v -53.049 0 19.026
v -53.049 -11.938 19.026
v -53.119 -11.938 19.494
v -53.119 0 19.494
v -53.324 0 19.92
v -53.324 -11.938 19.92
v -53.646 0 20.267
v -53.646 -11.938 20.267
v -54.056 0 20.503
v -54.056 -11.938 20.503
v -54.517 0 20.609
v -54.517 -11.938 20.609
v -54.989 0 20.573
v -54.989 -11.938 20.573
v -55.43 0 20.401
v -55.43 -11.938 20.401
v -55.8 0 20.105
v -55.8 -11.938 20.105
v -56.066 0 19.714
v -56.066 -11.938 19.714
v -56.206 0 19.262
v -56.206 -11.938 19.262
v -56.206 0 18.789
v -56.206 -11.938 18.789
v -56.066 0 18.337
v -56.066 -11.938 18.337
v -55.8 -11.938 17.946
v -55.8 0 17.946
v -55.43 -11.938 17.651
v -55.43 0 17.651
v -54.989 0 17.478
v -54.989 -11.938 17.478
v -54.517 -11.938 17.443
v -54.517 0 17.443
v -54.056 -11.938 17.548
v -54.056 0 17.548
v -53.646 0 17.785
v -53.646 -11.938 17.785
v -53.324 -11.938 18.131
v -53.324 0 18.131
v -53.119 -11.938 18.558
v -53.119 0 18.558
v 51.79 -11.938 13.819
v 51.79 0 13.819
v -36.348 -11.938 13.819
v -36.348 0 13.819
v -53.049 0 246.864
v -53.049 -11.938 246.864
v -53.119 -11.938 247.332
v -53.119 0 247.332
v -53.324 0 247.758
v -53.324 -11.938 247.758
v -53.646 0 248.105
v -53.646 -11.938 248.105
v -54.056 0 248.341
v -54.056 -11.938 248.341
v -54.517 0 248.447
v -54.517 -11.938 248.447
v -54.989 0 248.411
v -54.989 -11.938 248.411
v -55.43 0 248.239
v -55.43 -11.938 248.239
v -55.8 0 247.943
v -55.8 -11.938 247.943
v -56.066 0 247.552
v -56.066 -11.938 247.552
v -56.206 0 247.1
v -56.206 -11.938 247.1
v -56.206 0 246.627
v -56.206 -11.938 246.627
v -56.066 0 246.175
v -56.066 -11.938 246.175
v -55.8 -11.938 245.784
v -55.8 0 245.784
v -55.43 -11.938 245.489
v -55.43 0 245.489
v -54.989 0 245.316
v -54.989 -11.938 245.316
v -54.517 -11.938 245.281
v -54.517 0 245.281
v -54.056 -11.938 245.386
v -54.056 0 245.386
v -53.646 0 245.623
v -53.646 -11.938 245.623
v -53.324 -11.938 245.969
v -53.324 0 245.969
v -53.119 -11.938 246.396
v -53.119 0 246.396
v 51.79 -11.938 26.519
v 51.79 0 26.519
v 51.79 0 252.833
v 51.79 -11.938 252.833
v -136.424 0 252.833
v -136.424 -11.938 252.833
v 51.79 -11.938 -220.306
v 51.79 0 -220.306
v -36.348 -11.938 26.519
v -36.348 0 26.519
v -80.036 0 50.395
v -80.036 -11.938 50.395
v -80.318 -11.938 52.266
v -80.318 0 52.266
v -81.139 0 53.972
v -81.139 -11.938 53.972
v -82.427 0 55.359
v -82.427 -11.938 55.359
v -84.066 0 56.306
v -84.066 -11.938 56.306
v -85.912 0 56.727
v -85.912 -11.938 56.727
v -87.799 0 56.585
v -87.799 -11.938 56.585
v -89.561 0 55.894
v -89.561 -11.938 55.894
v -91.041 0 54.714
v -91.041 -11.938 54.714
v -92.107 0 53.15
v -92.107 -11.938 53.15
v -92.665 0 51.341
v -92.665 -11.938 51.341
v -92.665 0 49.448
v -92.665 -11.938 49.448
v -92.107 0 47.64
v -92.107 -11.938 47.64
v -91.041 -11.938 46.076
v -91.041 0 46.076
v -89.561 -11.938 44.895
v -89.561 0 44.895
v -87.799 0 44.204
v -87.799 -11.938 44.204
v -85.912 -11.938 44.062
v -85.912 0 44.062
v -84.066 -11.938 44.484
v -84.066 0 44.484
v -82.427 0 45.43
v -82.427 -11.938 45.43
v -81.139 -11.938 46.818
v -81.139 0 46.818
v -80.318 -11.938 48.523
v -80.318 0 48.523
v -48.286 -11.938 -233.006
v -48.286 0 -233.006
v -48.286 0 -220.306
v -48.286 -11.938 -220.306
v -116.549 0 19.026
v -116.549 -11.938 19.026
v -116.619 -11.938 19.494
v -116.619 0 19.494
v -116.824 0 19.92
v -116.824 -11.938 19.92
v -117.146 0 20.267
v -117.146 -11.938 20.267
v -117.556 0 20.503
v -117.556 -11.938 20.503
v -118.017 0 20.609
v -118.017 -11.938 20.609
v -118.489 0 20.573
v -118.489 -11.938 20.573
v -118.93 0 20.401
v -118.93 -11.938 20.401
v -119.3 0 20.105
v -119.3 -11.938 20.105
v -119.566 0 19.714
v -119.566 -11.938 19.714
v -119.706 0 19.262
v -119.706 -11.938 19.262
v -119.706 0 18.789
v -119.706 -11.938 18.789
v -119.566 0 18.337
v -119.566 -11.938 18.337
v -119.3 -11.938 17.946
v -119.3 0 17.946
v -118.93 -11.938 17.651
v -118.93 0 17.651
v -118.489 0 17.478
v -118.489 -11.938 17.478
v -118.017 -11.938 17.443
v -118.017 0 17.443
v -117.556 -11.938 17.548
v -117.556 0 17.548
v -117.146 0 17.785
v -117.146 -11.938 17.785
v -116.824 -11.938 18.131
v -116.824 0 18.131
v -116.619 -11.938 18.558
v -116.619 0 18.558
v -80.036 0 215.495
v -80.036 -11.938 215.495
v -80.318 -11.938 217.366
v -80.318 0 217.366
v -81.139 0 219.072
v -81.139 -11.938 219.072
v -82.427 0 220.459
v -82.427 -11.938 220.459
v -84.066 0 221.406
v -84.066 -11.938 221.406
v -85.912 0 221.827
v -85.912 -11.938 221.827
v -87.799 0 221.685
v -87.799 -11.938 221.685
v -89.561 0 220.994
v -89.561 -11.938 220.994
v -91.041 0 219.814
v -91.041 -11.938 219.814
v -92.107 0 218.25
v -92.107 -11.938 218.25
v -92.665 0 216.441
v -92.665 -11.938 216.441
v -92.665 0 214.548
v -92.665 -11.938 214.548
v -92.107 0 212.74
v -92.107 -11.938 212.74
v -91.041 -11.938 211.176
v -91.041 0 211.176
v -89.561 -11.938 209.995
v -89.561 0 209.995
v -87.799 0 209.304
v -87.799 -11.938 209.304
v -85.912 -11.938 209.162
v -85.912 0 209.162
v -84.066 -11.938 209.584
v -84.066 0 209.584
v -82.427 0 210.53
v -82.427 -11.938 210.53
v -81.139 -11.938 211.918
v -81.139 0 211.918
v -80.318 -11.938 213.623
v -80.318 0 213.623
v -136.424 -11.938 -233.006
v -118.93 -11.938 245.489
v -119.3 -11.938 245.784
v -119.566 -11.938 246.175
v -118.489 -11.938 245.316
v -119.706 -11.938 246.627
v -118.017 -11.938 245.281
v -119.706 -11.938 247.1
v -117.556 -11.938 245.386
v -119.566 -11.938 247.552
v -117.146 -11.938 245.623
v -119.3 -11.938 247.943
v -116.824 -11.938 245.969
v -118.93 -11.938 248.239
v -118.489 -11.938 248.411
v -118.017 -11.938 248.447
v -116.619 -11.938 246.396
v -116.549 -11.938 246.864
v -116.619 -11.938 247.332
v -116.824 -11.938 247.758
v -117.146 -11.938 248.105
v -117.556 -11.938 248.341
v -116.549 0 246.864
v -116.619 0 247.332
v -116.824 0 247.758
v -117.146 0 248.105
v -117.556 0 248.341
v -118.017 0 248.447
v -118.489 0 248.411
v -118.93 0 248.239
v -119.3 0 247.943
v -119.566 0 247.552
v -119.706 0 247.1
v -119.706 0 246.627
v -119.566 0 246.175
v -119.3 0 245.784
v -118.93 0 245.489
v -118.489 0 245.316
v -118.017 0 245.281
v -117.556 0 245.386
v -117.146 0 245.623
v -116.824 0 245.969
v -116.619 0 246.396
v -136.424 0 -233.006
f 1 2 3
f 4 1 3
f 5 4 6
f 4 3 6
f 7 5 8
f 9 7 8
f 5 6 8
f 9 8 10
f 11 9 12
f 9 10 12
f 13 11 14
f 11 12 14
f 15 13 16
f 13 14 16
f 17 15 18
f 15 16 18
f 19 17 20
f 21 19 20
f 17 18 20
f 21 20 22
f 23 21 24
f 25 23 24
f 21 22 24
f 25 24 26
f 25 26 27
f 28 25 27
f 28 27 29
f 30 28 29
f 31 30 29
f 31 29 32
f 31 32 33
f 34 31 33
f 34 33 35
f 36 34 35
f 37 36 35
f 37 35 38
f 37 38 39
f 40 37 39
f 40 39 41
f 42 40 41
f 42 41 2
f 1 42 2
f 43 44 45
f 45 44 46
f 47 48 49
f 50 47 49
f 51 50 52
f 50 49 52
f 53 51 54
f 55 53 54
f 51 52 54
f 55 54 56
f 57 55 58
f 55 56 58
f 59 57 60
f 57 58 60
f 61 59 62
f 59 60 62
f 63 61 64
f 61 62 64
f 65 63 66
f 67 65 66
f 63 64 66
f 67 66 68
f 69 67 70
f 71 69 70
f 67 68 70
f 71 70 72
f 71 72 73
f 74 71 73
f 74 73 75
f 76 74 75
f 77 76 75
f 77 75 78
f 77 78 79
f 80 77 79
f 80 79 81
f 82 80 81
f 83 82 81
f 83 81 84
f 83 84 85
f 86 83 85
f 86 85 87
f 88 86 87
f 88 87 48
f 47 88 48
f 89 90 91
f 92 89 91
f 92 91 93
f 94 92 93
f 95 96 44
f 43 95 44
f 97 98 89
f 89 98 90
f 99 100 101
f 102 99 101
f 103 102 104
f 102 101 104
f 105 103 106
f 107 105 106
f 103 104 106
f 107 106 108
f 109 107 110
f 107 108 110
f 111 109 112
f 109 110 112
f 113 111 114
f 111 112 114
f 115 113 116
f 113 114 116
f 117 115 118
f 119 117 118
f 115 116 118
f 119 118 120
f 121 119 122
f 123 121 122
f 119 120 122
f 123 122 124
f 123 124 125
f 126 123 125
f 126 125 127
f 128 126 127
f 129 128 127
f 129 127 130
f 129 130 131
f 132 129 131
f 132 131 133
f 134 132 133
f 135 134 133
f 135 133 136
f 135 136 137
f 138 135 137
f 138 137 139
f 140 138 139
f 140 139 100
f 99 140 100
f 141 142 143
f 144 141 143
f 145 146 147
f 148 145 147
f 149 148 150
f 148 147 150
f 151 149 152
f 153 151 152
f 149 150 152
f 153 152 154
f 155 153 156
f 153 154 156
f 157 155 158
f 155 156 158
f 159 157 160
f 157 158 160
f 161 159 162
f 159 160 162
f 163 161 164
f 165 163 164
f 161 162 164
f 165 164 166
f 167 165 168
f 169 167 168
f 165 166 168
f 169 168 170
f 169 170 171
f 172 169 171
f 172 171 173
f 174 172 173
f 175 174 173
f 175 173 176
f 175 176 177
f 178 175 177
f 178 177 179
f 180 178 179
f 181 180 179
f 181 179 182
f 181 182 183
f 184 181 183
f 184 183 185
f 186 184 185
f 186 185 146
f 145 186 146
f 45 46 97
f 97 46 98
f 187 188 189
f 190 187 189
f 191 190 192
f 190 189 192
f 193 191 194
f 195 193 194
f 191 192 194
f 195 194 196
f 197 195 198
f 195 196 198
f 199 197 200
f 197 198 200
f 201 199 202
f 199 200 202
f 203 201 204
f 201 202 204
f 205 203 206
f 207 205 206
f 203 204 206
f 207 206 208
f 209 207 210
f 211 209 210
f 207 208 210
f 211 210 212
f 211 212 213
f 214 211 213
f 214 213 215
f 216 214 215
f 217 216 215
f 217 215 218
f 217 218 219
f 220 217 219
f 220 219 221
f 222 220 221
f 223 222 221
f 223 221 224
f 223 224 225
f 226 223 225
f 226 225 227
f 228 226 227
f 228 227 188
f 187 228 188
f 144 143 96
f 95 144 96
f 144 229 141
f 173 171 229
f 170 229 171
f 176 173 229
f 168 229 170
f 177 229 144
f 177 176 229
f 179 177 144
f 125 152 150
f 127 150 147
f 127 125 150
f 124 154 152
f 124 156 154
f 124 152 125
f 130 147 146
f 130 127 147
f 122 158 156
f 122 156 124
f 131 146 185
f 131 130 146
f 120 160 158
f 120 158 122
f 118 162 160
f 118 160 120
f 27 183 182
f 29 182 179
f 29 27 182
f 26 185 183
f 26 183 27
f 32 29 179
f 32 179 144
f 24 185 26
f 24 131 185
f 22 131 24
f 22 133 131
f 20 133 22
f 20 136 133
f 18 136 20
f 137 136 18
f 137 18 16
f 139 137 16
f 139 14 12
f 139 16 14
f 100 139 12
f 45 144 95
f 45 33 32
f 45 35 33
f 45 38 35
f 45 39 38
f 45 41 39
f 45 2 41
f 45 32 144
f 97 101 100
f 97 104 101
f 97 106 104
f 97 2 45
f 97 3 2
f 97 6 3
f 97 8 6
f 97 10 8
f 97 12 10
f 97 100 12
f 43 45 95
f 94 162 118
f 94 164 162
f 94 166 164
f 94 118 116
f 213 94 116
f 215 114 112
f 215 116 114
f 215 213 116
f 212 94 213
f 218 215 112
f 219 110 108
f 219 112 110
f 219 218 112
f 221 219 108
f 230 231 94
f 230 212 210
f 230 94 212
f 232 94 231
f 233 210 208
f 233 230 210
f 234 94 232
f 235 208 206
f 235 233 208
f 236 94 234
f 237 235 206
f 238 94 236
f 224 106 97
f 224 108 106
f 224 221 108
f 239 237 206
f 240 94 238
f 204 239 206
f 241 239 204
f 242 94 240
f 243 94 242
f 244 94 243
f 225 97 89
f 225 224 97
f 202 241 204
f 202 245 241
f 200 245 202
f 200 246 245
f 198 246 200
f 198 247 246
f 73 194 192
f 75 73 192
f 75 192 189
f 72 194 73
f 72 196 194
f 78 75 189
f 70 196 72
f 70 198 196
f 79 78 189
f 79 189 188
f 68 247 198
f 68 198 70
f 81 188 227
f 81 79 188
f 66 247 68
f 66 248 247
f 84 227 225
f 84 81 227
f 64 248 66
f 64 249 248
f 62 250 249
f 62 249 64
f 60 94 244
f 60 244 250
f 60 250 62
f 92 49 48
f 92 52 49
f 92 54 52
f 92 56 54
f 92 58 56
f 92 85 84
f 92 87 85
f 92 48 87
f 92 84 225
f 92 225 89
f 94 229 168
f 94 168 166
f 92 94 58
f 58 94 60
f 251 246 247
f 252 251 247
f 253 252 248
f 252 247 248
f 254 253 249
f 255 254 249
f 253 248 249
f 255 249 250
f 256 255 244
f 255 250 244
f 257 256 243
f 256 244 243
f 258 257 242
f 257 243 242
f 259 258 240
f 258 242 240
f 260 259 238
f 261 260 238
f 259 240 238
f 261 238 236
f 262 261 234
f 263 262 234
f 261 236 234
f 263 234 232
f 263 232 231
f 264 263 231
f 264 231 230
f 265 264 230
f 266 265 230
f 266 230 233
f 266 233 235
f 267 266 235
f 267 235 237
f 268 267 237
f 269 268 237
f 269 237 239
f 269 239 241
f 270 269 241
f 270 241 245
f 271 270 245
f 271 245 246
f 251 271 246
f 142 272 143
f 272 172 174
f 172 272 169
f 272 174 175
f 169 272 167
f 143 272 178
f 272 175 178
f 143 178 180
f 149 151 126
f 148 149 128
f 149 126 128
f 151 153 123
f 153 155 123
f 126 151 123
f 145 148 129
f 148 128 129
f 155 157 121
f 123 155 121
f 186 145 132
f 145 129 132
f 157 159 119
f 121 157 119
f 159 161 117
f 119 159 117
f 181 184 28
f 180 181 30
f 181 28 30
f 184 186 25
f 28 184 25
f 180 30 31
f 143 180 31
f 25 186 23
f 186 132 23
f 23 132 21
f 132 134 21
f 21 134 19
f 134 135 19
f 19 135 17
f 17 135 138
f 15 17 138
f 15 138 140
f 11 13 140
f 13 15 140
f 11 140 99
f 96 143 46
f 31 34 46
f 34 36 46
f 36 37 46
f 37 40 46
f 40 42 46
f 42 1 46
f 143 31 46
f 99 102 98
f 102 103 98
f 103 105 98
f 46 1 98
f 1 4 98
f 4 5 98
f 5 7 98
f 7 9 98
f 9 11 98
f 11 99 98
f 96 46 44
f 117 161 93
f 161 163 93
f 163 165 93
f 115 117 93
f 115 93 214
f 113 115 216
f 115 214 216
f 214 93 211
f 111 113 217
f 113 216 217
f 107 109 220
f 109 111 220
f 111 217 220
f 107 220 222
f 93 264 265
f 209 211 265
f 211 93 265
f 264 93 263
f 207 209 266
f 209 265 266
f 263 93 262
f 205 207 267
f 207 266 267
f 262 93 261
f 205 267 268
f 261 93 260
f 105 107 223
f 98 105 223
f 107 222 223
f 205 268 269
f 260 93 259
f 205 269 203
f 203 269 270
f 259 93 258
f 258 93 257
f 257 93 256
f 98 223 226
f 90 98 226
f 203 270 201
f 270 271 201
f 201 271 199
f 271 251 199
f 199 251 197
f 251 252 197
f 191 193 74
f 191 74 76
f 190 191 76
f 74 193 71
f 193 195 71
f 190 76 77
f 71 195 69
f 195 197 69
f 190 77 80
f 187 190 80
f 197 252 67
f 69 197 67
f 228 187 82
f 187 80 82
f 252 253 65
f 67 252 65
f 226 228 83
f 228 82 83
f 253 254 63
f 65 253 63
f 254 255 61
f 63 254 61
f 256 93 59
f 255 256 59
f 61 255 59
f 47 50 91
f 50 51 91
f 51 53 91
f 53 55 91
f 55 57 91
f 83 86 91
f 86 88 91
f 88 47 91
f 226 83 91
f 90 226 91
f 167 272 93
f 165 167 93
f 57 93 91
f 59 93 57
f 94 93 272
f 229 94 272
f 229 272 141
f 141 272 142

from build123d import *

# Parameters (mm, degrees)
F1_DEPTH = 11.938
F2_R     = 6.35
F2_R_2   = 1.5875
F3_DEPTH = 11.939


with BuildPart() as f1:
    # F0 (on Front) → F1 (new body)
    with BuildSketch(Plane.XZ):
        Polygon((-36.348071, 252.832707), (-136.424071, 252.832707), (-136.424071, -233.005793), (-48.286071, -233.005793), (-48.286071, -220.305793), (51.789929, -220.305793), (51.789929, 13.818707), (-36.348071, 13.818707), (-36.348071, 26.518707), (51.789929, 26.518707), (51.789929, 252.832707), align=None)
    extrude(amount=F1_DEPTH)

    # F2 (on face) → F3 (cut, through all)
    with BuildSketch(Plane.XZ.offset(11.938)):
        with Locations((-86.386071, 215.494707)):
            Circle(F2_R)
        with Locations((-86.386071, 50.394707)):
            Circle(F2_R)
        with Locations((-118.136071, 246.863707)):
            Circle(F2_R_2)
        with Locations((-54.636071, 246.863707)):
            Circle(F2_R_2)
        with Locations((-118.136071, 19.025707)):
            Circle(F2_R_2)
        with Locations((-54.636071, 19.025707)):
            Circle(F2_R_2)
    extrude(amount=-F3_DEPTH, mode=Mode.SUBTRACT)


solid = f1.part
